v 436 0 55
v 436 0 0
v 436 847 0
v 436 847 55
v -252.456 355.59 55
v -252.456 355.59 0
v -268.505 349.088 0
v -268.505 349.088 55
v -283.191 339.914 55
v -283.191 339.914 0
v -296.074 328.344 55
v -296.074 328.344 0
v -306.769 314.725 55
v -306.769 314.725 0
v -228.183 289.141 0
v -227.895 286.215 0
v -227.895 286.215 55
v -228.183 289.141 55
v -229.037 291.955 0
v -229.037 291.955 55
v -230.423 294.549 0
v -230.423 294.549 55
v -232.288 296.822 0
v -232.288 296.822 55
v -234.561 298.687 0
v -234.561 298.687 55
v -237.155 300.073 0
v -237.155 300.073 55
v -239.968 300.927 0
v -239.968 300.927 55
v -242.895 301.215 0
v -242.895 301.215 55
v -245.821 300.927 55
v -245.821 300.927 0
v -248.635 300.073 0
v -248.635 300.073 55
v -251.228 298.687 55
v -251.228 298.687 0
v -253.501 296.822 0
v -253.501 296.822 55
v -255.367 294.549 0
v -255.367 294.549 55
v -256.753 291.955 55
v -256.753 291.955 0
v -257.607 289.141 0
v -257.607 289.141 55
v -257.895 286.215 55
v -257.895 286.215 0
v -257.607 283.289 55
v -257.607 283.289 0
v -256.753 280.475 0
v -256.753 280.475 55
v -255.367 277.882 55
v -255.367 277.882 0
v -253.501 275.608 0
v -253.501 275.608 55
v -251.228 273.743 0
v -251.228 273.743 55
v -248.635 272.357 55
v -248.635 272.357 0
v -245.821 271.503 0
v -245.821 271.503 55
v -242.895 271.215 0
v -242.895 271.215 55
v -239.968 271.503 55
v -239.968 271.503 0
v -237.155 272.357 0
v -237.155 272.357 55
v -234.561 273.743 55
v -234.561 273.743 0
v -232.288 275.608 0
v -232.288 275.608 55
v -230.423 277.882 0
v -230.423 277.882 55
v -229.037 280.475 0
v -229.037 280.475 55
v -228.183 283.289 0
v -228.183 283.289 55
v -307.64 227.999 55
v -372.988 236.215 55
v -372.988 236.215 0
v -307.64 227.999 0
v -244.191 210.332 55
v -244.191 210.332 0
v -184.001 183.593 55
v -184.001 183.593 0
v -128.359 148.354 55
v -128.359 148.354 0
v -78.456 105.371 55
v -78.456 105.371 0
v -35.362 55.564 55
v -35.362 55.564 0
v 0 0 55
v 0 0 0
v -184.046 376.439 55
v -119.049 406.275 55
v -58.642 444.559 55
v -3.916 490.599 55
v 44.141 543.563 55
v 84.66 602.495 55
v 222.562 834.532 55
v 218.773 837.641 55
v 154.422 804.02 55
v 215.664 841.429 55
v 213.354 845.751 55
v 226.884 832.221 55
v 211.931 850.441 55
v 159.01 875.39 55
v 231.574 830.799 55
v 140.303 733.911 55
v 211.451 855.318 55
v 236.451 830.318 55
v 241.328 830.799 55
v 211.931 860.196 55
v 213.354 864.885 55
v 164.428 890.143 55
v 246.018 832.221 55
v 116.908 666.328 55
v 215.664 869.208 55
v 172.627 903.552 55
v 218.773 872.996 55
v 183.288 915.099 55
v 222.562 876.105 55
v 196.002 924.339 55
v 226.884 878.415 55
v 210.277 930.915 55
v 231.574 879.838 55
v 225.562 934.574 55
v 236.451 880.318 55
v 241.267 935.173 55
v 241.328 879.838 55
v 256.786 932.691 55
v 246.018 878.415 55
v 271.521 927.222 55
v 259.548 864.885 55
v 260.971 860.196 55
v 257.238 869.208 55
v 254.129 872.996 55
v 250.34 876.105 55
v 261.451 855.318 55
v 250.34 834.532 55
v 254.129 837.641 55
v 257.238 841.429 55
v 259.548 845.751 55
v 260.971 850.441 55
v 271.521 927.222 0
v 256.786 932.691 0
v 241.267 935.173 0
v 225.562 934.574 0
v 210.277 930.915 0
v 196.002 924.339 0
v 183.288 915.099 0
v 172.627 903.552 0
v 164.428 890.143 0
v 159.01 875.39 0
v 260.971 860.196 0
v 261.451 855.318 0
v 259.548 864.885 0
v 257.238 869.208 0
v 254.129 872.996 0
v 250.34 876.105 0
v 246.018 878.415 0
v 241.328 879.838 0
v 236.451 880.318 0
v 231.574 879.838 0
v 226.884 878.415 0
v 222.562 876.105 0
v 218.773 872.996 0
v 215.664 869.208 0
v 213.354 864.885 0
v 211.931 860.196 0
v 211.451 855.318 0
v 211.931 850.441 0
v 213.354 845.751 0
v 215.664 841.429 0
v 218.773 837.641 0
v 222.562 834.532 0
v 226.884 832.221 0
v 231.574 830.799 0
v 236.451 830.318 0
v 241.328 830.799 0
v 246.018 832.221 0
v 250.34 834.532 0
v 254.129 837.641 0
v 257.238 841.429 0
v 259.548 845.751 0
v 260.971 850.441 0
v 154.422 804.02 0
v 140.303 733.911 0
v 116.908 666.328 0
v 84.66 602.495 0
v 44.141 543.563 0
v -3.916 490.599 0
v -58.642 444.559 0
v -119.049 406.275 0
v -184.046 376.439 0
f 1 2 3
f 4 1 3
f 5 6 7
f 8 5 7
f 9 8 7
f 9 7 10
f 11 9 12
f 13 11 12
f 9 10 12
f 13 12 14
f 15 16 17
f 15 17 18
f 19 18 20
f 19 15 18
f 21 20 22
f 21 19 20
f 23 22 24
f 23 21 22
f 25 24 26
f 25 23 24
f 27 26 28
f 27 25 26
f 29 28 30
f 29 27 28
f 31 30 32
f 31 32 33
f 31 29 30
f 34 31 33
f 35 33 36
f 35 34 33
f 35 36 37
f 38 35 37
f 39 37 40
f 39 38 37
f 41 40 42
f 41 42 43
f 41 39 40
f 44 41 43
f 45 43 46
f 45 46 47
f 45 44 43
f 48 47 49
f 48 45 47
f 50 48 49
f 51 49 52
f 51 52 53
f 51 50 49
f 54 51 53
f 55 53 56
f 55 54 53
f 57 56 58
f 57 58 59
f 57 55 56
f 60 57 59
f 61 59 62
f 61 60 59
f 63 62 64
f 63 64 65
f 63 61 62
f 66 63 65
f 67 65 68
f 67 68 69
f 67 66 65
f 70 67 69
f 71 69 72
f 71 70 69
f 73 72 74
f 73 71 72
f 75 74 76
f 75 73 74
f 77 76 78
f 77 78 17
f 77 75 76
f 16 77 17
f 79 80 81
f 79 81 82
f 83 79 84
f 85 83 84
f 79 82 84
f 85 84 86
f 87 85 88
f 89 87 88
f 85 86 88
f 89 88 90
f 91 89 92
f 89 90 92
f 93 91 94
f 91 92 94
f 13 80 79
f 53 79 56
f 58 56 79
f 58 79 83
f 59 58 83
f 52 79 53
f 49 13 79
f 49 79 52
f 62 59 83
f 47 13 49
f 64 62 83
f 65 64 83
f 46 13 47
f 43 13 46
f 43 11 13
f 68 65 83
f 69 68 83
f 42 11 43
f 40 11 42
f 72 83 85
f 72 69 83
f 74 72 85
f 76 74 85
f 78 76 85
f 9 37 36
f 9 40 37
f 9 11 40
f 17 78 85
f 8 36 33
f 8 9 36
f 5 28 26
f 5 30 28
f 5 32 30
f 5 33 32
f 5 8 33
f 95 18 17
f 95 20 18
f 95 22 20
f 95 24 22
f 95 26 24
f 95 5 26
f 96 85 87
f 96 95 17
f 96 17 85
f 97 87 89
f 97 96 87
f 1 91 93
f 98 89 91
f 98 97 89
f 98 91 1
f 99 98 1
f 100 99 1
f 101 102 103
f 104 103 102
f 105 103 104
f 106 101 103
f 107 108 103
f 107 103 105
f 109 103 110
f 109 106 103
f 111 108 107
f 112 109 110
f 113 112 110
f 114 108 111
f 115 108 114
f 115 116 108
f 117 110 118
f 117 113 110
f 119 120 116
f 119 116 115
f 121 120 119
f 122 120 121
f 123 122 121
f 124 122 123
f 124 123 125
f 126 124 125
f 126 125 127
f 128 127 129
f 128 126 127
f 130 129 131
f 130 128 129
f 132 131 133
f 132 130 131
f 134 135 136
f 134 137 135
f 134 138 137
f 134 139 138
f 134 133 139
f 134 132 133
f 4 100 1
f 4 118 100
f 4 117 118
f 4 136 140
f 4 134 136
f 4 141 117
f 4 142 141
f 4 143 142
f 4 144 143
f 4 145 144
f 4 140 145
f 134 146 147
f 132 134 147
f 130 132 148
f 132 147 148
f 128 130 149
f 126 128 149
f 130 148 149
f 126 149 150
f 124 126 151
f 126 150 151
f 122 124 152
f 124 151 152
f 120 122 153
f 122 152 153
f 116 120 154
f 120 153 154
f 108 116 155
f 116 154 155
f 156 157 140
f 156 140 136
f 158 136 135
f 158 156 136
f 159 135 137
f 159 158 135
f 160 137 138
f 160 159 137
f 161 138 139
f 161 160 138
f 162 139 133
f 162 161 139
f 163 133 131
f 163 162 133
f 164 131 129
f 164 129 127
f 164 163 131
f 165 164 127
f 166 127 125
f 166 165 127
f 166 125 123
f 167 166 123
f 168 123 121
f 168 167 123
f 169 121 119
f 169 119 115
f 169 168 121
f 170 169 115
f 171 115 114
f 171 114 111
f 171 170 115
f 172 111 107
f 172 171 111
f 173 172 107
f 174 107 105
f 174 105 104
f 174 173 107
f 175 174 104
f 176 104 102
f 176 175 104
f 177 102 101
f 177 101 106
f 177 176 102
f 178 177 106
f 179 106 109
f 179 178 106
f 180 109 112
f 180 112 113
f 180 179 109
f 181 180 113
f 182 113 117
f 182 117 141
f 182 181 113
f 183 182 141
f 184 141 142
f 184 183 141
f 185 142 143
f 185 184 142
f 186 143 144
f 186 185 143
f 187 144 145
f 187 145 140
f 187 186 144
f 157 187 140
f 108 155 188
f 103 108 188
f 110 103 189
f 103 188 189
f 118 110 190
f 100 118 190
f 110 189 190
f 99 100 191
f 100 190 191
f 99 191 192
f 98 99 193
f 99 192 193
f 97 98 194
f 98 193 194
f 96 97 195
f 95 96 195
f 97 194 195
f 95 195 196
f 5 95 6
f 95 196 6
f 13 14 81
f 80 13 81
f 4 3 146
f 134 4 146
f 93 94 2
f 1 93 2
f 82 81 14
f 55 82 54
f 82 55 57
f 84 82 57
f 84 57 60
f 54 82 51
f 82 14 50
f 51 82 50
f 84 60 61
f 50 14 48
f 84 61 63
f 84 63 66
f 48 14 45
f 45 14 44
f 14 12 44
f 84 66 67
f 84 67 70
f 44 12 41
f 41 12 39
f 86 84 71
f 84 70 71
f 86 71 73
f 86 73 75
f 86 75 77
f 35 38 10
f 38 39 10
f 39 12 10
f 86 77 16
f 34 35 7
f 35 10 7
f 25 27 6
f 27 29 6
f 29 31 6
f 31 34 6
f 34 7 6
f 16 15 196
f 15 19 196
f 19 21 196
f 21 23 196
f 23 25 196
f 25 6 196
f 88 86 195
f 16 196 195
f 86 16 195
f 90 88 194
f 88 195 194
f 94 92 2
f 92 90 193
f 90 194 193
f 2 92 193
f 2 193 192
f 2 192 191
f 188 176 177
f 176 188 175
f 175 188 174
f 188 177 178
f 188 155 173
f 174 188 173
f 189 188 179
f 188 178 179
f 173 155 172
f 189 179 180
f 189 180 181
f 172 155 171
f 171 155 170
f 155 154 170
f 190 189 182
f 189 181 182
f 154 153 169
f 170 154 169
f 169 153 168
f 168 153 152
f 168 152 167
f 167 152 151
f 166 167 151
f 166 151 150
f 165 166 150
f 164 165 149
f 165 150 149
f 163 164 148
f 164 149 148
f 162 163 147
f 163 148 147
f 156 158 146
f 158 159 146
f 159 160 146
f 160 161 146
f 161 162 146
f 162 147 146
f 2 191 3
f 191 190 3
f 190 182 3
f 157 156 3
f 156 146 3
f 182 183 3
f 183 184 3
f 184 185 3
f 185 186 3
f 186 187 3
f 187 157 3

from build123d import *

# Parameters (mm, degrees)
SKETCH1_R           = 25
SKETCH1_R_2         = 15
BOSS_EXTRUDE1_DEPTH = 55


with BuildPart() as part:
    # Sketch1 → Boss-Extrude1 (new body)
    with BuildSketch(Plane.XY):
        with BuildLine():
            Line((0, 0), (436, 0))
            Line((436, 0), (436, 847))
            Line((436, 847), (271.520689527, 927.221919862))
            ThreePointArc((271.520689527, 927.221919862), (202.977427959, 927.978702538), (159.009788885, 875.389747989))
            ThreePointArc((159.009788885, 875.389747989), (44.140964675, 543.56321378), (-252.456286899, 355.590433997))
            ThreePointArc((-252.456286899, 355.590433997), (-283.190978989, 339.913558022), (-306.768623817, 314.724663594))
            Line((-306.768623817, 314.724663594), (-372.987704373, 236.21505403))
            ThreePointArc((-372.987704373, 236.21505403), (-155.534588664, 166.992745943), (0, 0))
        make_face()
        with Locations((236.450997784, 855.318396158)):
            Circle(SKETCH1_R, mode=Mode.SUBTRACT)
        with Locations((-242.894848687, 286.21505403)):
            Circle(SKETCH1_R_2, mode=Mode.SUBTRACT)
    extrude(amount=BOSS_EXTRUDE1_DEPTH)


solid = part.part
